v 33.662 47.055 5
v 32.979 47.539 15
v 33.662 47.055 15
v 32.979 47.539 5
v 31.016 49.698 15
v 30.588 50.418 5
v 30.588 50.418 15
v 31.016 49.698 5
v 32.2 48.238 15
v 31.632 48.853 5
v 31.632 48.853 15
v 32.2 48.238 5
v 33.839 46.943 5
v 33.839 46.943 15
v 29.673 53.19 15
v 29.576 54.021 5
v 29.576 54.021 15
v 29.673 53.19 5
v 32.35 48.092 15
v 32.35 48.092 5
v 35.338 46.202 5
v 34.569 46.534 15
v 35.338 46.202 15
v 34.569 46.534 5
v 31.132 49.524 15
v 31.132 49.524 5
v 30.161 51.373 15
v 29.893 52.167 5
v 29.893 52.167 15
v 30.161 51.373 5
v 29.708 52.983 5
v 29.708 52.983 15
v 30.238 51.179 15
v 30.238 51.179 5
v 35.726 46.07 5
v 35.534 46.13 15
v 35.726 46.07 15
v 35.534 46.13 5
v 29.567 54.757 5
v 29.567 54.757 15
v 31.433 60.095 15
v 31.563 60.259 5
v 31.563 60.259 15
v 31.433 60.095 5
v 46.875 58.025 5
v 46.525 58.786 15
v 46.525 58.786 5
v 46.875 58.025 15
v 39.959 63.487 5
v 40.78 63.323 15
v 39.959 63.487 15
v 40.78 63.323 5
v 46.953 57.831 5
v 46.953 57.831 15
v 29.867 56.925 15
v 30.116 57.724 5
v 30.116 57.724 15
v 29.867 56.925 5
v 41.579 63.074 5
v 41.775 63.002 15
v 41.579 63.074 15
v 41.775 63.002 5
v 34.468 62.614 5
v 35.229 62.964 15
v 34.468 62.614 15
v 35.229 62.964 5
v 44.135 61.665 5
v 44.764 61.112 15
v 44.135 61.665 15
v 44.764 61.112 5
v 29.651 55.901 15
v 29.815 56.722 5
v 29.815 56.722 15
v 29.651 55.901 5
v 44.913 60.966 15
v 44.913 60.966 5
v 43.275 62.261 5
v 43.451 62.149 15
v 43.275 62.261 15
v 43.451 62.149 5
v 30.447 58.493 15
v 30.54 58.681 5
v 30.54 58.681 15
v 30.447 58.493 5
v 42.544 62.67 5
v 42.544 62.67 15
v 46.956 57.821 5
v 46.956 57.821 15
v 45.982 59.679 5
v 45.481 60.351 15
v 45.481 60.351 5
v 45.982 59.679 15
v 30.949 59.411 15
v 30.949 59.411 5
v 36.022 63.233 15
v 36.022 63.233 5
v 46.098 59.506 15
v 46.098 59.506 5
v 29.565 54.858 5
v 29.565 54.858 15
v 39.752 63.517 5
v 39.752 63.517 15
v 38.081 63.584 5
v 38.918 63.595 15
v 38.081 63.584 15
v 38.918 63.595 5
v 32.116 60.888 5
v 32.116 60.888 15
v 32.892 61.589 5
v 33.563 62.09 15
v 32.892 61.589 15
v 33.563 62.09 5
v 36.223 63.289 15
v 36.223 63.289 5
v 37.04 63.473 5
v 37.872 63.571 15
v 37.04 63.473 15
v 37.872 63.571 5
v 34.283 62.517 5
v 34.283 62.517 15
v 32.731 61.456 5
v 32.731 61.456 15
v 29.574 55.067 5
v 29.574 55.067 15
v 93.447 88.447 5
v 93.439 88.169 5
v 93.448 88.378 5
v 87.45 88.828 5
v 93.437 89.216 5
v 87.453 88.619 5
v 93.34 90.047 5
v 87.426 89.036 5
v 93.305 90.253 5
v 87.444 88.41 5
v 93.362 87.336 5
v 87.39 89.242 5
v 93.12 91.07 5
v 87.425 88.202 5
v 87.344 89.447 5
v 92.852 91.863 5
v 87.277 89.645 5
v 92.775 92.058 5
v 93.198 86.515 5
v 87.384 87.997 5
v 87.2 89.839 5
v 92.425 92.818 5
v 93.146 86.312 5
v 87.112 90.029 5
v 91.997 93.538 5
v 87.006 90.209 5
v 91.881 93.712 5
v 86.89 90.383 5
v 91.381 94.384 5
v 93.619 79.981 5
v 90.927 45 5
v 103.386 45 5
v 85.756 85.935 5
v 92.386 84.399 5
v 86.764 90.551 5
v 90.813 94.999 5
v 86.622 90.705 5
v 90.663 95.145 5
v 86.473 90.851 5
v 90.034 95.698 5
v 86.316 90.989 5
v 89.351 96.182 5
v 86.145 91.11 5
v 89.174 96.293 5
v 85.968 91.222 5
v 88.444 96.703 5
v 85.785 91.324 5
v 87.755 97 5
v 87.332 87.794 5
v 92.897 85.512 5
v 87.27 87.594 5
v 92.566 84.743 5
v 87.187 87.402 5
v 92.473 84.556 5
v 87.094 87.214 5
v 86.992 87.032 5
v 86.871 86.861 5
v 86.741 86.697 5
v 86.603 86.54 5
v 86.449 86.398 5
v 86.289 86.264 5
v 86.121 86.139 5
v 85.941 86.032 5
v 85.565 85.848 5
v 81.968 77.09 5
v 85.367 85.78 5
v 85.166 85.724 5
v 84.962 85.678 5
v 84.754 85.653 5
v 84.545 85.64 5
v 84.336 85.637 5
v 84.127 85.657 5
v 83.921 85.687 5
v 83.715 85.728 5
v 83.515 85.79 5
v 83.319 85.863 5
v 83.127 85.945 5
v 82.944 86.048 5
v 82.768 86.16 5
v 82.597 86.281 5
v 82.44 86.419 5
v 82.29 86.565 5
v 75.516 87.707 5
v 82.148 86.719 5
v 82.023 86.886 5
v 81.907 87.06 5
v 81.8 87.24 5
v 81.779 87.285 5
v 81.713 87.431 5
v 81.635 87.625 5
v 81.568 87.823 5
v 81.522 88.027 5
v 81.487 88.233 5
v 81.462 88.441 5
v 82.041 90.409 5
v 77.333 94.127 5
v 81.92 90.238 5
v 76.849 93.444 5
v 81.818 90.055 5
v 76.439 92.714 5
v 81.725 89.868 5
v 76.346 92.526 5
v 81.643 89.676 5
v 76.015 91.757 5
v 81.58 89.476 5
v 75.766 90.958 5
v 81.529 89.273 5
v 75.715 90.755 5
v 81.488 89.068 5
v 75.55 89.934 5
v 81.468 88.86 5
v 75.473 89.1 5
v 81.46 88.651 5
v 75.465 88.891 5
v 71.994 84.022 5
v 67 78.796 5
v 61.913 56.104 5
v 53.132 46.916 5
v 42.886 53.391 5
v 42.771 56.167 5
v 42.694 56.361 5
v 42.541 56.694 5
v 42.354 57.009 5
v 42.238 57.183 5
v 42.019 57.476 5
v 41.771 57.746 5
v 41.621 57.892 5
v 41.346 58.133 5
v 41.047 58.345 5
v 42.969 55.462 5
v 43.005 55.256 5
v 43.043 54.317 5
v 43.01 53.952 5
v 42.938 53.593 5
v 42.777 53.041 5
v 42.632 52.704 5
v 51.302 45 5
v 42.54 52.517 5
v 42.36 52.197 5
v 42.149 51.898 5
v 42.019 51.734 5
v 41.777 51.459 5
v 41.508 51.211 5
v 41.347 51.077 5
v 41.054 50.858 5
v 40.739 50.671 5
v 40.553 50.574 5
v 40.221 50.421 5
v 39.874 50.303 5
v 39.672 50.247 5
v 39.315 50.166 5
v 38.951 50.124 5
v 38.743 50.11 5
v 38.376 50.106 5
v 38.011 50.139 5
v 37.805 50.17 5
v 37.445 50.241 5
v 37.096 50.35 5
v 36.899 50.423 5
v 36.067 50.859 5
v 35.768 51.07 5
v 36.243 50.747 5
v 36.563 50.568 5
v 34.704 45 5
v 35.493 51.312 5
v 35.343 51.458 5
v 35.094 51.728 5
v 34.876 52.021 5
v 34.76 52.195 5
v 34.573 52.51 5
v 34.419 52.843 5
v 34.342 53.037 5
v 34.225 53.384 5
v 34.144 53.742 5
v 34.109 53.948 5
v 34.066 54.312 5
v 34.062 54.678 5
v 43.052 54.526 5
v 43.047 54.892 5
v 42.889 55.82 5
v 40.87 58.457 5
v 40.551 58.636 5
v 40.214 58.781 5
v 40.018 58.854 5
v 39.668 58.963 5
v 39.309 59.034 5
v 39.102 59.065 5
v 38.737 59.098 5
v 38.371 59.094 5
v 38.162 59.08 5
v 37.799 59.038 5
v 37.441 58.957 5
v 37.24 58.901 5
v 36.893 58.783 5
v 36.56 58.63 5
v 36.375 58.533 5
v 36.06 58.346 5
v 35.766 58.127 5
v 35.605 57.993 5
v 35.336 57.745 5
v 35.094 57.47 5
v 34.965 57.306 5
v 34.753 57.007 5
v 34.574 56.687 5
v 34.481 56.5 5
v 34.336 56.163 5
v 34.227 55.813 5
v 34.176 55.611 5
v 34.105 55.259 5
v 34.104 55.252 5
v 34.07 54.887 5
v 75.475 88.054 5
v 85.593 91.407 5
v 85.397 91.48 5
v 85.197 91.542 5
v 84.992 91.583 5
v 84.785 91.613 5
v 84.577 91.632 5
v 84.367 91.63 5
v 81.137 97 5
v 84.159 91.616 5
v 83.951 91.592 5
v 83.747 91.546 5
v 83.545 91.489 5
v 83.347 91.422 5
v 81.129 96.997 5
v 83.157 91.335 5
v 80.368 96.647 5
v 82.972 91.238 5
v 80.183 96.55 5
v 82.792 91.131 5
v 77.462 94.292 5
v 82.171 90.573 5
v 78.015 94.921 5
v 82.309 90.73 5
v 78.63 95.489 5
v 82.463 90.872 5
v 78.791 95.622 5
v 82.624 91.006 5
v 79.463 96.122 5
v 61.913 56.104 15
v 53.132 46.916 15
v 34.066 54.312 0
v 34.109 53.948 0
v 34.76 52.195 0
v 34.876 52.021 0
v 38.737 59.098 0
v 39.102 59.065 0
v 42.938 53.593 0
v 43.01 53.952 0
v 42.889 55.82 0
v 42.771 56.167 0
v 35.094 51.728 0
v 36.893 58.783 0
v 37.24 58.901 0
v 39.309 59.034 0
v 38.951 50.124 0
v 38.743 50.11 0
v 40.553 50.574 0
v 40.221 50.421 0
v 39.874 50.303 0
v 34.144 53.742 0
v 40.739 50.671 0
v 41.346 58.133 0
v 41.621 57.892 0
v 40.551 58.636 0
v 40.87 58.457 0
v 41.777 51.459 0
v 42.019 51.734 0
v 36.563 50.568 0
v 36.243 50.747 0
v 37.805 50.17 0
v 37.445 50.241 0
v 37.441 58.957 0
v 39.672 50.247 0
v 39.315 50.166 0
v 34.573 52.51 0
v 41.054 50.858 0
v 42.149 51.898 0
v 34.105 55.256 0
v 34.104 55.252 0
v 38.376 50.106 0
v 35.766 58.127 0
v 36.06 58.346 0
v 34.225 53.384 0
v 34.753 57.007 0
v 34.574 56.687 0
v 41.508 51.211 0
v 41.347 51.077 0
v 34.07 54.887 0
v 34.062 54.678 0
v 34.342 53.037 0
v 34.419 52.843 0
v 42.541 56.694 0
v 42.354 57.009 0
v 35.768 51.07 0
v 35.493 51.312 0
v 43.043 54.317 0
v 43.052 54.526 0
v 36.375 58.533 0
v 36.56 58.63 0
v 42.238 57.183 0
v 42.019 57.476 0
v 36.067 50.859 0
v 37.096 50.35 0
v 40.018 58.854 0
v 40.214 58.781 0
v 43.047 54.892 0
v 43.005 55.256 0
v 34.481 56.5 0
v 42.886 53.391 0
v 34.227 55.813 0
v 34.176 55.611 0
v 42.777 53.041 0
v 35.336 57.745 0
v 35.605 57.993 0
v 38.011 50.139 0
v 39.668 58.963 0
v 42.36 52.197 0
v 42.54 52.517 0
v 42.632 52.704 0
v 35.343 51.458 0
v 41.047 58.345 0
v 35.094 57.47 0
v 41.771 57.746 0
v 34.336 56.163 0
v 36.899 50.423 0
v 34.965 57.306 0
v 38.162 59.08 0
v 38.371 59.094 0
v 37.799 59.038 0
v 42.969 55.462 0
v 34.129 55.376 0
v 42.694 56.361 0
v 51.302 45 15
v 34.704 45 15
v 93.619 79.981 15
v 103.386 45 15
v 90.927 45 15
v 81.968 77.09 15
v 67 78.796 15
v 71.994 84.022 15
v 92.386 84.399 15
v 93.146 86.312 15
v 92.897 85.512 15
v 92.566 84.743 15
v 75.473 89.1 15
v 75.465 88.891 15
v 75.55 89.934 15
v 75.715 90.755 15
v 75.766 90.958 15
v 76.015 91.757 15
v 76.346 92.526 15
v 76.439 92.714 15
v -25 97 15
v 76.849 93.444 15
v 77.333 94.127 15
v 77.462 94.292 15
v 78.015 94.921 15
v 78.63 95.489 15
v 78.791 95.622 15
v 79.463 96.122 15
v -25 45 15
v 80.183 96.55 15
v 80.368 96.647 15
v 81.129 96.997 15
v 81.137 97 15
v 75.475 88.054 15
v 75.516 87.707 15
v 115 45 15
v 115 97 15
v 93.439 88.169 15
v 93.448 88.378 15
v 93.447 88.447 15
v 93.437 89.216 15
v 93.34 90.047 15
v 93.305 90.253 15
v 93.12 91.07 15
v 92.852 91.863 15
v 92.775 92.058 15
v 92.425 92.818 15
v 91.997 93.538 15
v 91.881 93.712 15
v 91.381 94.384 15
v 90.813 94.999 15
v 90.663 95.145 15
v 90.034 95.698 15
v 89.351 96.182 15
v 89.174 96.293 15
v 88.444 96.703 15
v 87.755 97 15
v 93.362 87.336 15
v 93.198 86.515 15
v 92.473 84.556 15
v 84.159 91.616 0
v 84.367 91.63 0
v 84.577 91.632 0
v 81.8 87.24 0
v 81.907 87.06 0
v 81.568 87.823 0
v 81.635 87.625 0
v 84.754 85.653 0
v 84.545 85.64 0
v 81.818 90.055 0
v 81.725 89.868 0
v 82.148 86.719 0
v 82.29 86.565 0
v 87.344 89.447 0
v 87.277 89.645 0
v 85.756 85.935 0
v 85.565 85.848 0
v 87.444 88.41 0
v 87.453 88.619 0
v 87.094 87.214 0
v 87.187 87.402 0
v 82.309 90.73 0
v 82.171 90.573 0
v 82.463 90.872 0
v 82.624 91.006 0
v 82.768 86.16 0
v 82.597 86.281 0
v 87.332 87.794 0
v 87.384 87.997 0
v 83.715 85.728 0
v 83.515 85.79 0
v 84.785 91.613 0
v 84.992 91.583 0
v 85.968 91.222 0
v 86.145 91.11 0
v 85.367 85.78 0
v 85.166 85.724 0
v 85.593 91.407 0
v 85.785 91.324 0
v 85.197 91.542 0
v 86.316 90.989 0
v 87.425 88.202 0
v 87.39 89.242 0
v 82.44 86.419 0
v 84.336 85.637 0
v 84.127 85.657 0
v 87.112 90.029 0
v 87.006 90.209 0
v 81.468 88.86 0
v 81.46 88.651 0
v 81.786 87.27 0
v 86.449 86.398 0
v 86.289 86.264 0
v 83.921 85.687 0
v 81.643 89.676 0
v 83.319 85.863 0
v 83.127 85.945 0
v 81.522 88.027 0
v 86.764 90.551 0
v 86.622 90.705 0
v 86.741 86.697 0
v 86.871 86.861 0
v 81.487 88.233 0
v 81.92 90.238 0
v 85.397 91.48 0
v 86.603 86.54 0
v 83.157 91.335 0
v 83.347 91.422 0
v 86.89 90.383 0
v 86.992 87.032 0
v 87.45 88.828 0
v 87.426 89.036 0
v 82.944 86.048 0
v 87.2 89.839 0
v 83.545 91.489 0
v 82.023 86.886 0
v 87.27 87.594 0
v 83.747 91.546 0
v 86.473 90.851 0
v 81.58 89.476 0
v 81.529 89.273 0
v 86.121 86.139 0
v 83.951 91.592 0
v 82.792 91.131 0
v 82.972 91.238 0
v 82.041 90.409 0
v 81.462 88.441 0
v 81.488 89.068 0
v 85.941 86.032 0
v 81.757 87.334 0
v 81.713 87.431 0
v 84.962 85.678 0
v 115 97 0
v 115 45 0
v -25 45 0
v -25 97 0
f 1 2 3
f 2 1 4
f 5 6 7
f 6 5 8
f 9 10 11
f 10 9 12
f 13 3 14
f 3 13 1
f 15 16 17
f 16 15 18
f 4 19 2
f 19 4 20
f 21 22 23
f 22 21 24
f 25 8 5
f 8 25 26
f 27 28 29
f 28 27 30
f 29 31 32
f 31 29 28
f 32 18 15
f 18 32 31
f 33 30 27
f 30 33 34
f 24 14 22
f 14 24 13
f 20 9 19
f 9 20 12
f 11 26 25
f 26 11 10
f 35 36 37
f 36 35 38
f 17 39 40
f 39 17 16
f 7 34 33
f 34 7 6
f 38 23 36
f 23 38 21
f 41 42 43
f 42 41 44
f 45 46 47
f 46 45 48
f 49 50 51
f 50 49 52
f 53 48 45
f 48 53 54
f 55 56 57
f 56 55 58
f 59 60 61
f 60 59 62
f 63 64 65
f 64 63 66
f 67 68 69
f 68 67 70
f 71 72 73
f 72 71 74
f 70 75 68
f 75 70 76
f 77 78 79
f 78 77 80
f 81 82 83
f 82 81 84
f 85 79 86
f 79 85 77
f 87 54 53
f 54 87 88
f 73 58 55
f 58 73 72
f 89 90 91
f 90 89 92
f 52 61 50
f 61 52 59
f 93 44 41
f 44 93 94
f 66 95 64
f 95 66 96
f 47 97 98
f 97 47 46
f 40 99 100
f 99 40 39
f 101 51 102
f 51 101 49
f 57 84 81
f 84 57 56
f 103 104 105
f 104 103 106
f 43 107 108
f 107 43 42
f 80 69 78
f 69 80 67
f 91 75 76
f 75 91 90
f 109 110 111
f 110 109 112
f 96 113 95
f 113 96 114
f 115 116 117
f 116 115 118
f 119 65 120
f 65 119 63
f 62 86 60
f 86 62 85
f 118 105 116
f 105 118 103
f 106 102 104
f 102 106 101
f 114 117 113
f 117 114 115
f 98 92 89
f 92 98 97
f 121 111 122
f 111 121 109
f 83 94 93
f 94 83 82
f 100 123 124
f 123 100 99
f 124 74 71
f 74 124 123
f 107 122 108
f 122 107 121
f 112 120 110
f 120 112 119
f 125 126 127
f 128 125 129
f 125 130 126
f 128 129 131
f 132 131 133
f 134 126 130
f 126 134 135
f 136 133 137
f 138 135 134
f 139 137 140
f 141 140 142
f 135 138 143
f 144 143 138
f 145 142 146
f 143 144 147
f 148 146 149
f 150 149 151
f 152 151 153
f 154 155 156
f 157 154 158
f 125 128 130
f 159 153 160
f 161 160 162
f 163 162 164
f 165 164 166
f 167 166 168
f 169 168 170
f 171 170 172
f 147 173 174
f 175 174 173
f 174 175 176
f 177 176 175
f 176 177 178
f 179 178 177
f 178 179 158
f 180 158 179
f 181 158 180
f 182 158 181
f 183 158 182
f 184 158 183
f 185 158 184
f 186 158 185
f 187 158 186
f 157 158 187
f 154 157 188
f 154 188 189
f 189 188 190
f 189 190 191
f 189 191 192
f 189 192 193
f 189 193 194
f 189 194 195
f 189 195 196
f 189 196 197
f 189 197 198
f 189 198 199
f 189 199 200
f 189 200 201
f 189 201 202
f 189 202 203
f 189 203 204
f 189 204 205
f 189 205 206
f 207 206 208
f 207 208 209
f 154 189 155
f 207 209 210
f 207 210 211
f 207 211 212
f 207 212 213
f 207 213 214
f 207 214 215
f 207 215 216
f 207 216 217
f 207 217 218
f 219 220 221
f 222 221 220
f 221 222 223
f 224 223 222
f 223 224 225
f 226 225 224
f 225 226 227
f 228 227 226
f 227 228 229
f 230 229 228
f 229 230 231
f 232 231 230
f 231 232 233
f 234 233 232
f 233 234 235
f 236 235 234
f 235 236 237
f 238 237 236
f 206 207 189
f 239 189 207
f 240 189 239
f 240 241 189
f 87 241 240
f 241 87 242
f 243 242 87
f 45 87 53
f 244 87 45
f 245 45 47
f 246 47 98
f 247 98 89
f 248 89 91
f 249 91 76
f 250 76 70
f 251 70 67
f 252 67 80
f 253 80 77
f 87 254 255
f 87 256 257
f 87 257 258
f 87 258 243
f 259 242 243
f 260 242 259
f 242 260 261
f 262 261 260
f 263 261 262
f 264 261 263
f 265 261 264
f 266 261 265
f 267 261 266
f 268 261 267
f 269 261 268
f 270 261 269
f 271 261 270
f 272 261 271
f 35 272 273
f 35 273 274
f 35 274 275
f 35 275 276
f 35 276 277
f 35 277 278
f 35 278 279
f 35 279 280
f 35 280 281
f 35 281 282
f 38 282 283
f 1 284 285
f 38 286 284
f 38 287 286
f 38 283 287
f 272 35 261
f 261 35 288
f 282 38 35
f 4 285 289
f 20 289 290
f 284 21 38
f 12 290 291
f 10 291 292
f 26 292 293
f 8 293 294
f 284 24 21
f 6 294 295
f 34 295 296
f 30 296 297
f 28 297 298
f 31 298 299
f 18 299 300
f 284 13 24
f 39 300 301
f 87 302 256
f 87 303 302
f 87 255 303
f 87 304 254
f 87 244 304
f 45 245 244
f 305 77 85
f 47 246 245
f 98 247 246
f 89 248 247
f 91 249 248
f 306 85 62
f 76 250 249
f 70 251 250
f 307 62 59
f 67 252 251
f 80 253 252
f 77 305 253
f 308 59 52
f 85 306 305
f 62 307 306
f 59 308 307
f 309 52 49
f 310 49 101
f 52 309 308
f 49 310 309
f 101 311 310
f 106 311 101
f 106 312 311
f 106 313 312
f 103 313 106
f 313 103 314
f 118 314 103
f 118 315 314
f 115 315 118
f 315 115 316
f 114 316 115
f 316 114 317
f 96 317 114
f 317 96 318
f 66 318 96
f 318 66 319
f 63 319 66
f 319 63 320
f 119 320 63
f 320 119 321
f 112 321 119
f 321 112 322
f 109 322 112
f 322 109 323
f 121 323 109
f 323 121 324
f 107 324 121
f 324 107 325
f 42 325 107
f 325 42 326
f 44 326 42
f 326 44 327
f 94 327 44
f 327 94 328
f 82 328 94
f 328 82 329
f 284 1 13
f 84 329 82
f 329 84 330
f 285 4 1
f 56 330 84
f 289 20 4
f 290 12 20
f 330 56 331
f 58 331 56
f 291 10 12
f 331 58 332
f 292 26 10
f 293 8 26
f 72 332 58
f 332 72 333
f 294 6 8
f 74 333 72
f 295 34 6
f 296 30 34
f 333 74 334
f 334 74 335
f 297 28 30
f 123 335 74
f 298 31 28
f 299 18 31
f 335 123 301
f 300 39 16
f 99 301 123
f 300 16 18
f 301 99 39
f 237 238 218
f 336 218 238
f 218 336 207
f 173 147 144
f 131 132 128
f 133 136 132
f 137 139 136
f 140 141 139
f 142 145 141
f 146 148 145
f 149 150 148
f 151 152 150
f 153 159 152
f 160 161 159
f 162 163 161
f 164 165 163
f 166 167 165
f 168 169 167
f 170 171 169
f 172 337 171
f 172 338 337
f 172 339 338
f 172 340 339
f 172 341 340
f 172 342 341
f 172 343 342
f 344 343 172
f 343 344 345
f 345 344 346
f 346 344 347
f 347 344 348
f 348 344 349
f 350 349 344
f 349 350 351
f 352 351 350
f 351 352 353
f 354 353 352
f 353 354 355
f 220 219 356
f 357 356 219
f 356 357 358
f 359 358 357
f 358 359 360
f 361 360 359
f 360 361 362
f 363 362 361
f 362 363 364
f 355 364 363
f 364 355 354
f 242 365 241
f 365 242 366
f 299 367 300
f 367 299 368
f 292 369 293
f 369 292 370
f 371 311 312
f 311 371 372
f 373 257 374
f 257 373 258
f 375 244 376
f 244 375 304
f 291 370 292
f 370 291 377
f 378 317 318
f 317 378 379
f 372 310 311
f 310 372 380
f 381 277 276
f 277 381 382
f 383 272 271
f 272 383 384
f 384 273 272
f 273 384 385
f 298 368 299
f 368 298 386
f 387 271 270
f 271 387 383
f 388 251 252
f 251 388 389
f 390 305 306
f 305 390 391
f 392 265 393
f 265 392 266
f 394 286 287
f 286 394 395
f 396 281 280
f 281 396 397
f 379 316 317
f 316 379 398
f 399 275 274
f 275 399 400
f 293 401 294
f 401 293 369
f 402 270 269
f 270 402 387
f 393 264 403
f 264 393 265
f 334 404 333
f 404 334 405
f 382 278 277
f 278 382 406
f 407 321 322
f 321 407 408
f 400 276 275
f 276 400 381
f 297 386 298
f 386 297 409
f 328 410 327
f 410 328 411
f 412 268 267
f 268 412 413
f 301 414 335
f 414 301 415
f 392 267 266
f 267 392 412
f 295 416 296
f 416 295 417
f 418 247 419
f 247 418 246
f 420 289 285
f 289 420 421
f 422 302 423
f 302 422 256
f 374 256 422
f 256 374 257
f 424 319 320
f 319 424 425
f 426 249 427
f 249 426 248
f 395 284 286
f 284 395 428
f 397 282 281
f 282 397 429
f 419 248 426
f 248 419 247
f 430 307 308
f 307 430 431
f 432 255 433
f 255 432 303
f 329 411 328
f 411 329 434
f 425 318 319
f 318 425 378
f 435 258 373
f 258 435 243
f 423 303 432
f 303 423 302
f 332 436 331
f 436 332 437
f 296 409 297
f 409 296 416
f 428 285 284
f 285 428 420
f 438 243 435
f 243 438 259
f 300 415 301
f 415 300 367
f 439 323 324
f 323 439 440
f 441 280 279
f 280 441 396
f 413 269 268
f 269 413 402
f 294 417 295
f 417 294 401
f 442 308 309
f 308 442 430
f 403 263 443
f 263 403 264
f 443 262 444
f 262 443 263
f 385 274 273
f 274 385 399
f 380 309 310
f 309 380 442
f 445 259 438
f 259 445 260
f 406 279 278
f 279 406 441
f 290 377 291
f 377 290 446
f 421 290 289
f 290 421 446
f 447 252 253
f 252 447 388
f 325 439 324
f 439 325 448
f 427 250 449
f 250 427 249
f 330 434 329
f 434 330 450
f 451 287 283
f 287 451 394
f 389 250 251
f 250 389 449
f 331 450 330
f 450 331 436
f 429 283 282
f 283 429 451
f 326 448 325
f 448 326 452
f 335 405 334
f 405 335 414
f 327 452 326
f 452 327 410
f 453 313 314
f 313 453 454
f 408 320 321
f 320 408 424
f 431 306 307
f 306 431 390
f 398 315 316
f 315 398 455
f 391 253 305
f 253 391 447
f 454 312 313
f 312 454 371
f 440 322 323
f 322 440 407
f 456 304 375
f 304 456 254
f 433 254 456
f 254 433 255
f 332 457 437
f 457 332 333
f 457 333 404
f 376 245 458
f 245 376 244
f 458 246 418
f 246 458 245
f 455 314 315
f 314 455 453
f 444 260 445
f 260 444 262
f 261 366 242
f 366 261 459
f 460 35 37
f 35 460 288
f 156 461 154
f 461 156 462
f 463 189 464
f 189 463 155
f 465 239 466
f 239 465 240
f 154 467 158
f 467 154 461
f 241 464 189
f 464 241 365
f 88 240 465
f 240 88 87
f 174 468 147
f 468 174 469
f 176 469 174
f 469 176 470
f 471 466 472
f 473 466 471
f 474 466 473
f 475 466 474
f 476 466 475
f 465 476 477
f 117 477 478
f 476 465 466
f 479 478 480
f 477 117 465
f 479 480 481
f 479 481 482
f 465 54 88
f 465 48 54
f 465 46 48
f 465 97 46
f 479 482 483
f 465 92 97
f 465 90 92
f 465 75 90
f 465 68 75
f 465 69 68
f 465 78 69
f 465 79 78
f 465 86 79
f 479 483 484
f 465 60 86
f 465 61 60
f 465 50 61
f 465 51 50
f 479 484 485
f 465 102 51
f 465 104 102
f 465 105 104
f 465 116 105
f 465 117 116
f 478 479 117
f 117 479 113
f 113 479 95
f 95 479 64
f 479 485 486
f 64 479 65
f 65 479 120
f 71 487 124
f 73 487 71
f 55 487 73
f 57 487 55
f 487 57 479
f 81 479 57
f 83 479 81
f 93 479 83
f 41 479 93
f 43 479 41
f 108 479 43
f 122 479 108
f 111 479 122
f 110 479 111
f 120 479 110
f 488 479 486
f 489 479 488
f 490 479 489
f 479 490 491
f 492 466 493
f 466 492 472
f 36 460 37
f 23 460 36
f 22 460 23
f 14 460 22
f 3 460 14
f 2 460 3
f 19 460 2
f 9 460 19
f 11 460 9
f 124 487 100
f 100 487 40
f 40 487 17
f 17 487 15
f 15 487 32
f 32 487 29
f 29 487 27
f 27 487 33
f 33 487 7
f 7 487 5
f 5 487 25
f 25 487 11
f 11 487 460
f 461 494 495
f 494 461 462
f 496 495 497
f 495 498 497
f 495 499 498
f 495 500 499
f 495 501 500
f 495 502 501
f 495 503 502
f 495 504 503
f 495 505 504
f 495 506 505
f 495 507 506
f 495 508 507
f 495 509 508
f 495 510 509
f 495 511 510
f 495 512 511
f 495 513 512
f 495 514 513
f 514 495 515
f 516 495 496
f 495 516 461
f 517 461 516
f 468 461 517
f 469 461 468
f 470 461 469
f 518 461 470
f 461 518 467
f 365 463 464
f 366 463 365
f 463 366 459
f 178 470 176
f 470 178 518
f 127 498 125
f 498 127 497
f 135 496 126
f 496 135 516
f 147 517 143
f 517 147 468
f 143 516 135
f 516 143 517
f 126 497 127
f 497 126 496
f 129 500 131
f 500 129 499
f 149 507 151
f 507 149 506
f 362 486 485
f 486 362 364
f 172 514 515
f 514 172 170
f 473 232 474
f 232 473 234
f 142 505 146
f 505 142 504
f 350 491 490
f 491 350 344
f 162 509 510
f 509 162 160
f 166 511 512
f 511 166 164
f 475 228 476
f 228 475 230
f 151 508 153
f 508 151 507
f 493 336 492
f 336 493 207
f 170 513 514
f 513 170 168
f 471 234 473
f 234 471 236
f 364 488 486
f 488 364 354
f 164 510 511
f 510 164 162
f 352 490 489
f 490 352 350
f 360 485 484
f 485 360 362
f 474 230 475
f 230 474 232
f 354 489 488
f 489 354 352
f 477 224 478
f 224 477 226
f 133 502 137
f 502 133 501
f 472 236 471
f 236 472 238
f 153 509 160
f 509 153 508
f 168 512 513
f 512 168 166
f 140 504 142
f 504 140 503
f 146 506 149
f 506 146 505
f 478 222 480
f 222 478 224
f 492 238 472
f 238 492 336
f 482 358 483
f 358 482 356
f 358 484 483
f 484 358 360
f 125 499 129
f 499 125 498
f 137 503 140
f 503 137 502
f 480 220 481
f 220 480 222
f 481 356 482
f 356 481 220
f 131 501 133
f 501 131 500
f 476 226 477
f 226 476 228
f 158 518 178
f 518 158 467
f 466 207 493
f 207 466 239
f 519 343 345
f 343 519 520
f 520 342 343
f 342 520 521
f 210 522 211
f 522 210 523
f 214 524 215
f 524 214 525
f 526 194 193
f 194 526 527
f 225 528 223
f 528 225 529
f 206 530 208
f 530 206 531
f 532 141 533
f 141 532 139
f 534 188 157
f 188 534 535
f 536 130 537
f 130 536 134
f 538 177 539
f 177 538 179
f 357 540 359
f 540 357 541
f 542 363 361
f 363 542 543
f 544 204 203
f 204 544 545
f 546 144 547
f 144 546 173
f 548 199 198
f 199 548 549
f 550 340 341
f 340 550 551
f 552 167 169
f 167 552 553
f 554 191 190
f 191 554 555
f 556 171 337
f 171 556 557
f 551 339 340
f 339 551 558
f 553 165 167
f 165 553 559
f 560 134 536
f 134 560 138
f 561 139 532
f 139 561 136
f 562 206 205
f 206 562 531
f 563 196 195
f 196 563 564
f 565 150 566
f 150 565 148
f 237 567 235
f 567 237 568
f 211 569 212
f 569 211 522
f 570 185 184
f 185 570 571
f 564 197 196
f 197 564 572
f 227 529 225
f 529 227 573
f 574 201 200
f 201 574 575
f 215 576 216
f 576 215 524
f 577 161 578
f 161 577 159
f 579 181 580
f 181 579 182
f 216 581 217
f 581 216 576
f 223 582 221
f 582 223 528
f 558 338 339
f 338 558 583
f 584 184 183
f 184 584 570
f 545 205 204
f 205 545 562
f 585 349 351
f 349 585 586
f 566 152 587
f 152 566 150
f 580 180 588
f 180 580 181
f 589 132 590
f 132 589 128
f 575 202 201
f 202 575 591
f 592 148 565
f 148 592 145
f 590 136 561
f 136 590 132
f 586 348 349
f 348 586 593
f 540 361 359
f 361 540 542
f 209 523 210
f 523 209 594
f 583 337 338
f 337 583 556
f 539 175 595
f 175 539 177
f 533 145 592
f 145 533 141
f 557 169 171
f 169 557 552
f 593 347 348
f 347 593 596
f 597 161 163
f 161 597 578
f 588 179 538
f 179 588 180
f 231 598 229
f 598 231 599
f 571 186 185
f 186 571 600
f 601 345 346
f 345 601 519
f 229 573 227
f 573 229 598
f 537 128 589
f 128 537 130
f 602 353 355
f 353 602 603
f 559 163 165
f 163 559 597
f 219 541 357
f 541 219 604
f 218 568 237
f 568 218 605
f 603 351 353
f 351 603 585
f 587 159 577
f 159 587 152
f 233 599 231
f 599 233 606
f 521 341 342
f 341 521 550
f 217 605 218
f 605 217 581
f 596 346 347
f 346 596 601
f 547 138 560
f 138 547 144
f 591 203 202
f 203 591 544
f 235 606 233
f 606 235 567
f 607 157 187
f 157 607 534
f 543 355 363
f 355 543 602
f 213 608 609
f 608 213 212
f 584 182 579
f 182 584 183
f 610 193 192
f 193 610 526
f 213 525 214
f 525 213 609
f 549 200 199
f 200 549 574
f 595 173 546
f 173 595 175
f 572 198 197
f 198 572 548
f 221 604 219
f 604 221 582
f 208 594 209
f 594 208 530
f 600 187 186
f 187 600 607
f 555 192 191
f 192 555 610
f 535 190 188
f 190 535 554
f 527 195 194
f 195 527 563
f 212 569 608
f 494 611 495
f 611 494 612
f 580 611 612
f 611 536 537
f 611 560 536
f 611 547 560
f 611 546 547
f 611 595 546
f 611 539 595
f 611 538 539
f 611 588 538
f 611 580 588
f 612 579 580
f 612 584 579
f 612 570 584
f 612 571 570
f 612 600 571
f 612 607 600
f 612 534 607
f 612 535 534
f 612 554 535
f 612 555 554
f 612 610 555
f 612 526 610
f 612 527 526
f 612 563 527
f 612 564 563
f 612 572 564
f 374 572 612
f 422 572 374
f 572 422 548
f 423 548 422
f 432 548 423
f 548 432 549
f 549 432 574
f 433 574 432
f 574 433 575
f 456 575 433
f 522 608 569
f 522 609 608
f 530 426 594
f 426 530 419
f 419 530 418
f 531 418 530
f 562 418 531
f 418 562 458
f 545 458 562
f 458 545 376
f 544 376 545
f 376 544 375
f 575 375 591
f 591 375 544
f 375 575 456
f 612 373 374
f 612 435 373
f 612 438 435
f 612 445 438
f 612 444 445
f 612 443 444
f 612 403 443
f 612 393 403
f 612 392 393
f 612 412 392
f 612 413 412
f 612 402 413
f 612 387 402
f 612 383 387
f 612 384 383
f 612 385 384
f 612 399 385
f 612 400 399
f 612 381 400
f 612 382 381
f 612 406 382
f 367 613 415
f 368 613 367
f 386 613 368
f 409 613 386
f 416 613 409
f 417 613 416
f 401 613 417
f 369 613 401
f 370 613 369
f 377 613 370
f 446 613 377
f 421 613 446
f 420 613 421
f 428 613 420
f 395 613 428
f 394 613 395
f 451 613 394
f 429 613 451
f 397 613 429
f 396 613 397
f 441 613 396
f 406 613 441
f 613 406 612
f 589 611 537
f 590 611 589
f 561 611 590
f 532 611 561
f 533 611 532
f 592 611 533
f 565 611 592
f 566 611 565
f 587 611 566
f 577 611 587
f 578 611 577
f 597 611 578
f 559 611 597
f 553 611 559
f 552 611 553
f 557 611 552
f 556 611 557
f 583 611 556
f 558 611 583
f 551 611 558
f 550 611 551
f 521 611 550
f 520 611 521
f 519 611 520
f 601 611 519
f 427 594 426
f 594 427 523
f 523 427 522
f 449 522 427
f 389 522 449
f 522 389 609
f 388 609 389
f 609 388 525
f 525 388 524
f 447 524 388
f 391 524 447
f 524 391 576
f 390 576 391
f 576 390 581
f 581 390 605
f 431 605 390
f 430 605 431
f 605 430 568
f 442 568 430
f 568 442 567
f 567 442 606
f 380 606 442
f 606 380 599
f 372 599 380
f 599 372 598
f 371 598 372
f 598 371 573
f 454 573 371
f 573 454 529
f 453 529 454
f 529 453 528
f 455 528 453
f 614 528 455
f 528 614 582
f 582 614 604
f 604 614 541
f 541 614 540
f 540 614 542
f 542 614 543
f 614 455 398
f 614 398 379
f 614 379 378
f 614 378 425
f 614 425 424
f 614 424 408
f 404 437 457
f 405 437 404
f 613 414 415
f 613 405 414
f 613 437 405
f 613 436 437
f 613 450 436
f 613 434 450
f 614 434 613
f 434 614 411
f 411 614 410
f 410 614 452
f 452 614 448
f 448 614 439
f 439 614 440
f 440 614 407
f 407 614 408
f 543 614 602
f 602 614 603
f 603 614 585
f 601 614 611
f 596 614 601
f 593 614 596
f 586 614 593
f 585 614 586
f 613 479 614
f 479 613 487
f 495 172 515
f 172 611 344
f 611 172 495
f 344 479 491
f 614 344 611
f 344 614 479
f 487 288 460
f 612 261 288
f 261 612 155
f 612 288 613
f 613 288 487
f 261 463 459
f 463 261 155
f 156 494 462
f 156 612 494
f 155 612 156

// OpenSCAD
difference(){
    
translate([-25,45,0])
cube([140,52,15]);

translate([0,0,5])rotate([0,0,3.7])
minkowski($fn=30){
    bogie();
    cylinder(r=1,h=0.001);
}

//translate([0,44,7.5])
//rotate([-90,0,0])cylinder(d=2.5,h=10);
//translate([75,44,7.5])
//rotate([-90,0,0])cylinder(d=2.5,h=10);
//translate([110,44,7.5])
//rotate([-90,0,0])cylinder(d=2.5,h=10);

}

module bogie(){

scale([1,1,2.5]){
$fn=60;

translate([90,83,0])
union(){
cylinder(d=16,h=8);
translate([0,0,-6])cylinder(d=4,h=10);
}

translate([42,52,0])
union(){
cylinder(d=16,h=8);
translate([0,0,-6])cylinder(d=7,h=10);
}

rotate([0,0,42.6])
translate([3,-5,0])cube([116,10,4]);

translate([108,0,0])rotate([0,0,101.9])
translate([3,-5,0])cube([78,10,4]);
}

}
